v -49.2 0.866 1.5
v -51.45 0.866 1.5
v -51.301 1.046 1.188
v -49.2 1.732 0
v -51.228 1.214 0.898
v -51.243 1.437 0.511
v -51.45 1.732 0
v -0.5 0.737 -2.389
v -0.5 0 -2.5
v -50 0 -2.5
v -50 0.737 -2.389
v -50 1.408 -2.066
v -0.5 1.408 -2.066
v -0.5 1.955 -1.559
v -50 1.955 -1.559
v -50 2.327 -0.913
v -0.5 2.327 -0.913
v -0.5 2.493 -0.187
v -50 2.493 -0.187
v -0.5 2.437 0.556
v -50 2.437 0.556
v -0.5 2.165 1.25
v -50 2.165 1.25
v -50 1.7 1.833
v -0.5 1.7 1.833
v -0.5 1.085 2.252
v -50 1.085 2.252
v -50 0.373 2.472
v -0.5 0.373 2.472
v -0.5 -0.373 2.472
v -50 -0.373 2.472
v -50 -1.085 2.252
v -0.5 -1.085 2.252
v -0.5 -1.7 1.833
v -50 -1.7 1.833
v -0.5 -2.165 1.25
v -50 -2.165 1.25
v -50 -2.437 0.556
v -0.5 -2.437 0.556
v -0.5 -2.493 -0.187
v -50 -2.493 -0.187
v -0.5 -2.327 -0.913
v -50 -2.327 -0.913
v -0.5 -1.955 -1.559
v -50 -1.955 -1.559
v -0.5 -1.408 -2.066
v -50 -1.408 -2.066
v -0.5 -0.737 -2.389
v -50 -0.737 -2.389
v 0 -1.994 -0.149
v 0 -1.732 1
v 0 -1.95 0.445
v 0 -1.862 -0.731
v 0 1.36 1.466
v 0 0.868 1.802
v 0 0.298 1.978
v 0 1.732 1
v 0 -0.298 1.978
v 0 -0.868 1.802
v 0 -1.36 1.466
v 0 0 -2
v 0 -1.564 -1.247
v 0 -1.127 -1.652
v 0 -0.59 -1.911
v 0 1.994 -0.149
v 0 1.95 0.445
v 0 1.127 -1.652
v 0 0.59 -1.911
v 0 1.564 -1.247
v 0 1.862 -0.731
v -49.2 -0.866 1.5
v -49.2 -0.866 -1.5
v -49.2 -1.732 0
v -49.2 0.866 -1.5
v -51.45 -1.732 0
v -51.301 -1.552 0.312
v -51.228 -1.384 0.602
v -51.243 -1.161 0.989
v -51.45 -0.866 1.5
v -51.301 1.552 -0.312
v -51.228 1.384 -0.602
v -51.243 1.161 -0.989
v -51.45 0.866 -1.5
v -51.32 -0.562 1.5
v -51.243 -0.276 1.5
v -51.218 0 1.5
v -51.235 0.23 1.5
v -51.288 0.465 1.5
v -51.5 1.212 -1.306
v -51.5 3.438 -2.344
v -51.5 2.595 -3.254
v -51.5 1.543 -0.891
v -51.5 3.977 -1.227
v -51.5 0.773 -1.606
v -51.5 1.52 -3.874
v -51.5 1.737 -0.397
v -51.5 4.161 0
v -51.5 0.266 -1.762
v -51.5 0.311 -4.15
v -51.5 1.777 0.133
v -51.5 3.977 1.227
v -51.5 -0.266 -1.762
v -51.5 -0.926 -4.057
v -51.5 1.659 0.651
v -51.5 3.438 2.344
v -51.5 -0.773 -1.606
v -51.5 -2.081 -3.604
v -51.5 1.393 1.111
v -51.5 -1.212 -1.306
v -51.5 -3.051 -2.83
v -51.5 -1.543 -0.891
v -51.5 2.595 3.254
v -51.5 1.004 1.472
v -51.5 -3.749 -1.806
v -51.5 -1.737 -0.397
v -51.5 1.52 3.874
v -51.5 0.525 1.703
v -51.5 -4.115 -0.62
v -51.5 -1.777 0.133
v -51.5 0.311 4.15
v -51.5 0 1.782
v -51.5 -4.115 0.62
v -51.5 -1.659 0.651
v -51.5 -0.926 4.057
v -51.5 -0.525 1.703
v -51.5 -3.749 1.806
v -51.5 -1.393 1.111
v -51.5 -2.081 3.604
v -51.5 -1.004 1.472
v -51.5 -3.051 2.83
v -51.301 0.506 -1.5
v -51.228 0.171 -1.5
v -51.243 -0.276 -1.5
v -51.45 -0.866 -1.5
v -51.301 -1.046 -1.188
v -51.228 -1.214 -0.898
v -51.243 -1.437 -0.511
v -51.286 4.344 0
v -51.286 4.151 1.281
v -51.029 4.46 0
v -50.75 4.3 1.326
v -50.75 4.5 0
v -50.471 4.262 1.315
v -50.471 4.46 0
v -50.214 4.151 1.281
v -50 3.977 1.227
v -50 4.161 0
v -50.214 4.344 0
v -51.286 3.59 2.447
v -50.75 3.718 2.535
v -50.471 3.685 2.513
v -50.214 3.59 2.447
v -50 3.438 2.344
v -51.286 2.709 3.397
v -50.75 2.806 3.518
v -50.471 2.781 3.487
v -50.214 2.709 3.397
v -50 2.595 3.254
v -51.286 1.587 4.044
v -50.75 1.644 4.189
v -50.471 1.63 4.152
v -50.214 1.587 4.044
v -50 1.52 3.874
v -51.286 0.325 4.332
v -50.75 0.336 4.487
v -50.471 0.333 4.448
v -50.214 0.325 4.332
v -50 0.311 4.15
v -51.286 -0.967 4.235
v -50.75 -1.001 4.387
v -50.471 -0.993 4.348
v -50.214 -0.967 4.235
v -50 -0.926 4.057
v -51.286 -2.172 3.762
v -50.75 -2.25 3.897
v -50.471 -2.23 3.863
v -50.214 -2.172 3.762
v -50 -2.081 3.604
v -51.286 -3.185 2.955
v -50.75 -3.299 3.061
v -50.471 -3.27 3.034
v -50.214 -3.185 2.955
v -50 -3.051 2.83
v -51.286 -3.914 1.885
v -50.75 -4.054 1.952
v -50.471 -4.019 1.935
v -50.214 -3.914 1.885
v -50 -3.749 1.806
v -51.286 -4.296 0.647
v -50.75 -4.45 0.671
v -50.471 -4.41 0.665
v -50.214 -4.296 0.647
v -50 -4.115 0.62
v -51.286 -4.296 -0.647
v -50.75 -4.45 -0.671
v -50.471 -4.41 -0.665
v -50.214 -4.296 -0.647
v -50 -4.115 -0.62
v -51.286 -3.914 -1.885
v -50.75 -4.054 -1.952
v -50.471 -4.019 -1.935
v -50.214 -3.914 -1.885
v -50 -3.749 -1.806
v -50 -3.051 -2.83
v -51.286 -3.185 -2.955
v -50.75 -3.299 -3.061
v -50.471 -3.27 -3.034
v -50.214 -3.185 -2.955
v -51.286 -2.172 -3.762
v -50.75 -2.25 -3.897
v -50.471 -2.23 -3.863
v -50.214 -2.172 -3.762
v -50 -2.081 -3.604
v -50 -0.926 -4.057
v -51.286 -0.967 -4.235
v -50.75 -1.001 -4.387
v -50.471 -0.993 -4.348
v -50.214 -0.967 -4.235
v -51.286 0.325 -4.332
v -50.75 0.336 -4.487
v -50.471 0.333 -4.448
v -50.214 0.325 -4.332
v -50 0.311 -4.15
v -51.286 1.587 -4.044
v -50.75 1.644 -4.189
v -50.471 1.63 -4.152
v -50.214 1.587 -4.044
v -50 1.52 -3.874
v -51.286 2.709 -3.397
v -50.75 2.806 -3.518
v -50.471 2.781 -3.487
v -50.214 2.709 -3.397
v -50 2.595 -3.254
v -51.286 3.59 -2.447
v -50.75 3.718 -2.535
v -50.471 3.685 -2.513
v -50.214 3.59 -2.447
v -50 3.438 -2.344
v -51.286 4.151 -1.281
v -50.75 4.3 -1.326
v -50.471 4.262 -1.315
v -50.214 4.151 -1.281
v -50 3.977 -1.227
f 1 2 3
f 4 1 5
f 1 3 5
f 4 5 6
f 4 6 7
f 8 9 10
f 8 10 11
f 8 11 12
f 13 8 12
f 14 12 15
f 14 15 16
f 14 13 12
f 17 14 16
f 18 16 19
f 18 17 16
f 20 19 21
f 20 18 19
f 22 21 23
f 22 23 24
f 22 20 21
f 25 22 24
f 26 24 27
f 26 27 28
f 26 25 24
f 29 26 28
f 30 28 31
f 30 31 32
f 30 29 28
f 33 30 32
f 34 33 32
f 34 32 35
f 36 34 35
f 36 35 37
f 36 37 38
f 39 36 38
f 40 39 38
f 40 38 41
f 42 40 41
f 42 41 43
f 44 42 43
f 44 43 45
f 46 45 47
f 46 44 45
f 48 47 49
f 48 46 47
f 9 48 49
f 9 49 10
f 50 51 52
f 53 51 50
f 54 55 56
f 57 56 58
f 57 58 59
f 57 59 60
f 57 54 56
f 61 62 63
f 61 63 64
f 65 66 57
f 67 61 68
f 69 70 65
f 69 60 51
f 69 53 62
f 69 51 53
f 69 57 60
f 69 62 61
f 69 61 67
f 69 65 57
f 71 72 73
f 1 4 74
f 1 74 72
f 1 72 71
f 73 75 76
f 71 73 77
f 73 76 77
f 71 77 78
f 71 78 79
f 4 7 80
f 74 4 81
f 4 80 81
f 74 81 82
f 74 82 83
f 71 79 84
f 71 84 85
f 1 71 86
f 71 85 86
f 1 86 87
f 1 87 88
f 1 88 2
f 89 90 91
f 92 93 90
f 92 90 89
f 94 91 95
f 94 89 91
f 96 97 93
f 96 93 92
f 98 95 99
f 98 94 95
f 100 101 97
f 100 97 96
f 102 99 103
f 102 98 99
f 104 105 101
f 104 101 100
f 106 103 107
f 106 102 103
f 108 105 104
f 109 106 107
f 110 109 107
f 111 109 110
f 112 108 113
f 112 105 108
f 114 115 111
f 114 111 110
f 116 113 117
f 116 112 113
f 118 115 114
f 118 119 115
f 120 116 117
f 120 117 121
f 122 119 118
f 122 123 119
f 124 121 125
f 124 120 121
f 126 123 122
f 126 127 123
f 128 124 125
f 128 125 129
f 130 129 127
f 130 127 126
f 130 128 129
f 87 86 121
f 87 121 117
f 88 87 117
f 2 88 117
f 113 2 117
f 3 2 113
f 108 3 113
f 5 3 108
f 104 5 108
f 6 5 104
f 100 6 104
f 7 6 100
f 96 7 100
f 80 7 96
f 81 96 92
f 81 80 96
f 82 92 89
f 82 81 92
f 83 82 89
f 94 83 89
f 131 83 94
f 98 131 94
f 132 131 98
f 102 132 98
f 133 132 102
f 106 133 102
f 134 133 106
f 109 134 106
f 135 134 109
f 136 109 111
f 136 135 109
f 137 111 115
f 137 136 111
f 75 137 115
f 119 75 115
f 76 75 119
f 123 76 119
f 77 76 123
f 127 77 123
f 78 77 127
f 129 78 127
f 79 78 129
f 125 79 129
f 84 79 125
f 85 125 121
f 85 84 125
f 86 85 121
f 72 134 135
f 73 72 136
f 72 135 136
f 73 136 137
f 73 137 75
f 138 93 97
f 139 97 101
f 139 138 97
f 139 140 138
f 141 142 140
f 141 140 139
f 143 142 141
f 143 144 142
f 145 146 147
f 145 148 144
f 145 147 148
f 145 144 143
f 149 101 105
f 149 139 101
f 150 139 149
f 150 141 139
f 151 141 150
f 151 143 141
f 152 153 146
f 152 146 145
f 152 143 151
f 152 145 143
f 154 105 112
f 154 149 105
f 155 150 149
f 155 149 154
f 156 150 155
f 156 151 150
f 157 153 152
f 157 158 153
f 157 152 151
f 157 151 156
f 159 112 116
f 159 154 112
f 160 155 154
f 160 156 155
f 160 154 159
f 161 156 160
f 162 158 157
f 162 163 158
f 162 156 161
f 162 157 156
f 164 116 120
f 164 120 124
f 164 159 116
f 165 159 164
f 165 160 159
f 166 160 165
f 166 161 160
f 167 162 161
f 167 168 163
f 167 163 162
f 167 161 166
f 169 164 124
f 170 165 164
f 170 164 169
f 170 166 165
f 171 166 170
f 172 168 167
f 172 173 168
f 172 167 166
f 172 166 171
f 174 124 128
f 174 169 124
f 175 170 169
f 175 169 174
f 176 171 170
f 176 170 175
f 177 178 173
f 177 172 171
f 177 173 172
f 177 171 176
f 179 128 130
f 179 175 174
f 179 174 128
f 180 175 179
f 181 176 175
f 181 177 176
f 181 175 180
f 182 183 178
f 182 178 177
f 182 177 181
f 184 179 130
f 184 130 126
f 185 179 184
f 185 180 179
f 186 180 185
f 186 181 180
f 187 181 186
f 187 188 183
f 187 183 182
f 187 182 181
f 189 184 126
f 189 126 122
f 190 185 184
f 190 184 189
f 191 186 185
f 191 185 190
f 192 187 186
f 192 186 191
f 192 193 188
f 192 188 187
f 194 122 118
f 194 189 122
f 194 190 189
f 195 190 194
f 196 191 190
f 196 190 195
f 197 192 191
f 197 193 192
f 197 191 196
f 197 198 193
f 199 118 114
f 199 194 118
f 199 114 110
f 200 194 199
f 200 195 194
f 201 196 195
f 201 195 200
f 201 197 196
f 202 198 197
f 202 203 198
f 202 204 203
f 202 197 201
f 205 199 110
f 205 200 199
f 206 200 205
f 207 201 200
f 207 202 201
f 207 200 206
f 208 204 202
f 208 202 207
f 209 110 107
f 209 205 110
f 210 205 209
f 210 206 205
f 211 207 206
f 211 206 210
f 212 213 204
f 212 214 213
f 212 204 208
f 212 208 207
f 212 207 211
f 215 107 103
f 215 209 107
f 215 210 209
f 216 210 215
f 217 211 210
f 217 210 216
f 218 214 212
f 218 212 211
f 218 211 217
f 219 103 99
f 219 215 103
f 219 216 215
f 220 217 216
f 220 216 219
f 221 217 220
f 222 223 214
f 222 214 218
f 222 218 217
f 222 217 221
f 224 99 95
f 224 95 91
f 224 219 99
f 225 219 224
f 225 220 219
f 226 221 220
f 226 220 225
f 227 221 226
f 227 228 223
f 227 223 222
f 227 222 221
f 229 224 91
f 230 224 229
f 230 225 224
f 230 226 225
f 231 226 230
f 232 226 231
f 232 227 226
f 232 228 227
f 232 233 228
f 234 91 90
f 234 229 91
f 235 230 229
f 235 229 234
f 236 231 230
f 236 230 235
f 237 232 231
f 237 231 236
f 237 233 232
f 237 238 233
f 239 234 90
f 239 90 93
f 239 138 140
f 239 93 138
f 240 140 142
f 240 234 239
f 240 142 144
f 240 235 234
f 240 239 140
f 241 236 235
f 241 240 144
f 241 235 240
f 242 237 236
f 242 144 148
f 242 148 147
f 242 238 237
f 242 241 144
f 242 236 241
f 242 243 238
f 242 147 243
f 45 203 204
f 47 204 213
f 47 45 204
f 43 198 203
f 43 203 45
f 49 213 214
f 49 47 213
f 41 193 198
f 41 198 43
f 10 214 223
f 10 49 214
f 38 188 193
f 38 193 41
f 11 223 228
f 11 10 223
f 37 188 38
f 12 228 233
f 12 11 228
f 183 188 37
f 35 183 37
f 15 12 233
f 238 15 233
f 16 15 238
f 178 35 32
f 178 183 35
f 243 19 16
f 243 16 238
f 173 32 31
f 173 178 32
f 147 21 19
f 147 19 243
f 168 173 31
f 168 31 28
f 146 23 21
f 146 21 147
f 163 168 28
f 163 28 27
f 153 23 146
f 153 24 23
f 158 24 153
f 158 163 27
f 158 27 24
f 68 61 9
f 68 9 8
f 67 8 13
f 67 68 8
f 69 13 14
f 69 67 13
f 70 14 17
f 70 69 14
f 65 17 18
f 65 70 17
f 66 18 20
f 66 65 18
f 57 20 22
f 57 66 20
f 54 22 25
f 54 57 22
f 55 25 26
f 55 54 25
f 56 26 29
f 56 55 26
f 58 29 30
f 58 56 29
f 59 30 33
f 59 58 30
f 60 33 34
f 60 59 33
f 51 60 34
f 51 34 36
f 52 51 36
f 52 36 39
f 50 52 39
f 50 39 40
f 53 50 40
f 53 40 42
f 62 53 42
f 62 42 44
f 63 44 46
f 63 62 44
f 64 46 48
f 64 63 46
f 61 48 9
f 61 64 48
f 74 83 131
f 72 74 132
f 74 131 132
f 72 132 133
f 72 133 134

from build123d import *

# Parameters (mm, degrees)
SKETCH2_R           = 2.5
BOSS_EXTRUDE1_DEPTH = 50
CHAMFER1_SIZE       = 0.5
CUT_EXTRUDE1_DEPTH  = 2.3
SKETCH8_R           = 1.782050808
CUT_EXTRUDE2_DEPTH  = 1
CUT_EXTRUDE2_TAPER  = 45


with BuildPart() as part:
    # Sketch2 → Boss-Extrude1 (new body)
    with BuildSketch(Plane(origin=(0, 0, 0), x_dir=(0, 0, -1), z_dir=(1, 0, 0))):
        Circle(SKETCH2_R)
    extrude(amount=-BOSS_EXTRUDE1_DEPTH)

    # Chamfer1
    chamfer1_edges = [part.edges().sort_by_distance(p)[0] for p in [
        (0, 0, 2.5),
    ]]
    chamfer(chamfer1_edges, length=CHAMFER1_SIZE)

    # Sketch6 → Revolve1 (revolve)
    with BuildSketch(Plane.XY):
        with BuildLine():
            Line((-51.5, 0), (-51.5, 4.161437828))
            ThreePointArc((-51.5, 4.161437828), (-50.75, 4.5), (-50, 4.161437828))
            Line((-50, 4.161437828), (-50, 0))
            Line((-50, 0), (-51.5, 0))
        make_face()
    revolve(axis=Axis((-50, 0, 0), (1, 0, 0)))

    # Sketch7 → Cut-Extrude1 (cut)
    with BuildSketch(Plane.ZY.offset(51.5)):
        Polygon((0, 1.732050808), (-1.5, 0.866025404), (-1.5, -0.866025404), (0, -1.732050808), (1.5, -0.866025404), (1.5, 0.866025404), align=None)
    extrude(amount=-CUT_EXTRUDE1_DEPTH, mode=Mode.SUBTRACT)

    # Sketch8 → Cut-Extrude2 (cut)
    with BuildSketch(Plane.ZY.offset(51.5)):
        Circle(SKETCH8_R)
    extrude(amount=-CUT_EXTRUDE2_DEPTH, taper=CUT_EXTRUDE2_TAPER, mode=Mode.SUBTRACT)


solid = part.part
